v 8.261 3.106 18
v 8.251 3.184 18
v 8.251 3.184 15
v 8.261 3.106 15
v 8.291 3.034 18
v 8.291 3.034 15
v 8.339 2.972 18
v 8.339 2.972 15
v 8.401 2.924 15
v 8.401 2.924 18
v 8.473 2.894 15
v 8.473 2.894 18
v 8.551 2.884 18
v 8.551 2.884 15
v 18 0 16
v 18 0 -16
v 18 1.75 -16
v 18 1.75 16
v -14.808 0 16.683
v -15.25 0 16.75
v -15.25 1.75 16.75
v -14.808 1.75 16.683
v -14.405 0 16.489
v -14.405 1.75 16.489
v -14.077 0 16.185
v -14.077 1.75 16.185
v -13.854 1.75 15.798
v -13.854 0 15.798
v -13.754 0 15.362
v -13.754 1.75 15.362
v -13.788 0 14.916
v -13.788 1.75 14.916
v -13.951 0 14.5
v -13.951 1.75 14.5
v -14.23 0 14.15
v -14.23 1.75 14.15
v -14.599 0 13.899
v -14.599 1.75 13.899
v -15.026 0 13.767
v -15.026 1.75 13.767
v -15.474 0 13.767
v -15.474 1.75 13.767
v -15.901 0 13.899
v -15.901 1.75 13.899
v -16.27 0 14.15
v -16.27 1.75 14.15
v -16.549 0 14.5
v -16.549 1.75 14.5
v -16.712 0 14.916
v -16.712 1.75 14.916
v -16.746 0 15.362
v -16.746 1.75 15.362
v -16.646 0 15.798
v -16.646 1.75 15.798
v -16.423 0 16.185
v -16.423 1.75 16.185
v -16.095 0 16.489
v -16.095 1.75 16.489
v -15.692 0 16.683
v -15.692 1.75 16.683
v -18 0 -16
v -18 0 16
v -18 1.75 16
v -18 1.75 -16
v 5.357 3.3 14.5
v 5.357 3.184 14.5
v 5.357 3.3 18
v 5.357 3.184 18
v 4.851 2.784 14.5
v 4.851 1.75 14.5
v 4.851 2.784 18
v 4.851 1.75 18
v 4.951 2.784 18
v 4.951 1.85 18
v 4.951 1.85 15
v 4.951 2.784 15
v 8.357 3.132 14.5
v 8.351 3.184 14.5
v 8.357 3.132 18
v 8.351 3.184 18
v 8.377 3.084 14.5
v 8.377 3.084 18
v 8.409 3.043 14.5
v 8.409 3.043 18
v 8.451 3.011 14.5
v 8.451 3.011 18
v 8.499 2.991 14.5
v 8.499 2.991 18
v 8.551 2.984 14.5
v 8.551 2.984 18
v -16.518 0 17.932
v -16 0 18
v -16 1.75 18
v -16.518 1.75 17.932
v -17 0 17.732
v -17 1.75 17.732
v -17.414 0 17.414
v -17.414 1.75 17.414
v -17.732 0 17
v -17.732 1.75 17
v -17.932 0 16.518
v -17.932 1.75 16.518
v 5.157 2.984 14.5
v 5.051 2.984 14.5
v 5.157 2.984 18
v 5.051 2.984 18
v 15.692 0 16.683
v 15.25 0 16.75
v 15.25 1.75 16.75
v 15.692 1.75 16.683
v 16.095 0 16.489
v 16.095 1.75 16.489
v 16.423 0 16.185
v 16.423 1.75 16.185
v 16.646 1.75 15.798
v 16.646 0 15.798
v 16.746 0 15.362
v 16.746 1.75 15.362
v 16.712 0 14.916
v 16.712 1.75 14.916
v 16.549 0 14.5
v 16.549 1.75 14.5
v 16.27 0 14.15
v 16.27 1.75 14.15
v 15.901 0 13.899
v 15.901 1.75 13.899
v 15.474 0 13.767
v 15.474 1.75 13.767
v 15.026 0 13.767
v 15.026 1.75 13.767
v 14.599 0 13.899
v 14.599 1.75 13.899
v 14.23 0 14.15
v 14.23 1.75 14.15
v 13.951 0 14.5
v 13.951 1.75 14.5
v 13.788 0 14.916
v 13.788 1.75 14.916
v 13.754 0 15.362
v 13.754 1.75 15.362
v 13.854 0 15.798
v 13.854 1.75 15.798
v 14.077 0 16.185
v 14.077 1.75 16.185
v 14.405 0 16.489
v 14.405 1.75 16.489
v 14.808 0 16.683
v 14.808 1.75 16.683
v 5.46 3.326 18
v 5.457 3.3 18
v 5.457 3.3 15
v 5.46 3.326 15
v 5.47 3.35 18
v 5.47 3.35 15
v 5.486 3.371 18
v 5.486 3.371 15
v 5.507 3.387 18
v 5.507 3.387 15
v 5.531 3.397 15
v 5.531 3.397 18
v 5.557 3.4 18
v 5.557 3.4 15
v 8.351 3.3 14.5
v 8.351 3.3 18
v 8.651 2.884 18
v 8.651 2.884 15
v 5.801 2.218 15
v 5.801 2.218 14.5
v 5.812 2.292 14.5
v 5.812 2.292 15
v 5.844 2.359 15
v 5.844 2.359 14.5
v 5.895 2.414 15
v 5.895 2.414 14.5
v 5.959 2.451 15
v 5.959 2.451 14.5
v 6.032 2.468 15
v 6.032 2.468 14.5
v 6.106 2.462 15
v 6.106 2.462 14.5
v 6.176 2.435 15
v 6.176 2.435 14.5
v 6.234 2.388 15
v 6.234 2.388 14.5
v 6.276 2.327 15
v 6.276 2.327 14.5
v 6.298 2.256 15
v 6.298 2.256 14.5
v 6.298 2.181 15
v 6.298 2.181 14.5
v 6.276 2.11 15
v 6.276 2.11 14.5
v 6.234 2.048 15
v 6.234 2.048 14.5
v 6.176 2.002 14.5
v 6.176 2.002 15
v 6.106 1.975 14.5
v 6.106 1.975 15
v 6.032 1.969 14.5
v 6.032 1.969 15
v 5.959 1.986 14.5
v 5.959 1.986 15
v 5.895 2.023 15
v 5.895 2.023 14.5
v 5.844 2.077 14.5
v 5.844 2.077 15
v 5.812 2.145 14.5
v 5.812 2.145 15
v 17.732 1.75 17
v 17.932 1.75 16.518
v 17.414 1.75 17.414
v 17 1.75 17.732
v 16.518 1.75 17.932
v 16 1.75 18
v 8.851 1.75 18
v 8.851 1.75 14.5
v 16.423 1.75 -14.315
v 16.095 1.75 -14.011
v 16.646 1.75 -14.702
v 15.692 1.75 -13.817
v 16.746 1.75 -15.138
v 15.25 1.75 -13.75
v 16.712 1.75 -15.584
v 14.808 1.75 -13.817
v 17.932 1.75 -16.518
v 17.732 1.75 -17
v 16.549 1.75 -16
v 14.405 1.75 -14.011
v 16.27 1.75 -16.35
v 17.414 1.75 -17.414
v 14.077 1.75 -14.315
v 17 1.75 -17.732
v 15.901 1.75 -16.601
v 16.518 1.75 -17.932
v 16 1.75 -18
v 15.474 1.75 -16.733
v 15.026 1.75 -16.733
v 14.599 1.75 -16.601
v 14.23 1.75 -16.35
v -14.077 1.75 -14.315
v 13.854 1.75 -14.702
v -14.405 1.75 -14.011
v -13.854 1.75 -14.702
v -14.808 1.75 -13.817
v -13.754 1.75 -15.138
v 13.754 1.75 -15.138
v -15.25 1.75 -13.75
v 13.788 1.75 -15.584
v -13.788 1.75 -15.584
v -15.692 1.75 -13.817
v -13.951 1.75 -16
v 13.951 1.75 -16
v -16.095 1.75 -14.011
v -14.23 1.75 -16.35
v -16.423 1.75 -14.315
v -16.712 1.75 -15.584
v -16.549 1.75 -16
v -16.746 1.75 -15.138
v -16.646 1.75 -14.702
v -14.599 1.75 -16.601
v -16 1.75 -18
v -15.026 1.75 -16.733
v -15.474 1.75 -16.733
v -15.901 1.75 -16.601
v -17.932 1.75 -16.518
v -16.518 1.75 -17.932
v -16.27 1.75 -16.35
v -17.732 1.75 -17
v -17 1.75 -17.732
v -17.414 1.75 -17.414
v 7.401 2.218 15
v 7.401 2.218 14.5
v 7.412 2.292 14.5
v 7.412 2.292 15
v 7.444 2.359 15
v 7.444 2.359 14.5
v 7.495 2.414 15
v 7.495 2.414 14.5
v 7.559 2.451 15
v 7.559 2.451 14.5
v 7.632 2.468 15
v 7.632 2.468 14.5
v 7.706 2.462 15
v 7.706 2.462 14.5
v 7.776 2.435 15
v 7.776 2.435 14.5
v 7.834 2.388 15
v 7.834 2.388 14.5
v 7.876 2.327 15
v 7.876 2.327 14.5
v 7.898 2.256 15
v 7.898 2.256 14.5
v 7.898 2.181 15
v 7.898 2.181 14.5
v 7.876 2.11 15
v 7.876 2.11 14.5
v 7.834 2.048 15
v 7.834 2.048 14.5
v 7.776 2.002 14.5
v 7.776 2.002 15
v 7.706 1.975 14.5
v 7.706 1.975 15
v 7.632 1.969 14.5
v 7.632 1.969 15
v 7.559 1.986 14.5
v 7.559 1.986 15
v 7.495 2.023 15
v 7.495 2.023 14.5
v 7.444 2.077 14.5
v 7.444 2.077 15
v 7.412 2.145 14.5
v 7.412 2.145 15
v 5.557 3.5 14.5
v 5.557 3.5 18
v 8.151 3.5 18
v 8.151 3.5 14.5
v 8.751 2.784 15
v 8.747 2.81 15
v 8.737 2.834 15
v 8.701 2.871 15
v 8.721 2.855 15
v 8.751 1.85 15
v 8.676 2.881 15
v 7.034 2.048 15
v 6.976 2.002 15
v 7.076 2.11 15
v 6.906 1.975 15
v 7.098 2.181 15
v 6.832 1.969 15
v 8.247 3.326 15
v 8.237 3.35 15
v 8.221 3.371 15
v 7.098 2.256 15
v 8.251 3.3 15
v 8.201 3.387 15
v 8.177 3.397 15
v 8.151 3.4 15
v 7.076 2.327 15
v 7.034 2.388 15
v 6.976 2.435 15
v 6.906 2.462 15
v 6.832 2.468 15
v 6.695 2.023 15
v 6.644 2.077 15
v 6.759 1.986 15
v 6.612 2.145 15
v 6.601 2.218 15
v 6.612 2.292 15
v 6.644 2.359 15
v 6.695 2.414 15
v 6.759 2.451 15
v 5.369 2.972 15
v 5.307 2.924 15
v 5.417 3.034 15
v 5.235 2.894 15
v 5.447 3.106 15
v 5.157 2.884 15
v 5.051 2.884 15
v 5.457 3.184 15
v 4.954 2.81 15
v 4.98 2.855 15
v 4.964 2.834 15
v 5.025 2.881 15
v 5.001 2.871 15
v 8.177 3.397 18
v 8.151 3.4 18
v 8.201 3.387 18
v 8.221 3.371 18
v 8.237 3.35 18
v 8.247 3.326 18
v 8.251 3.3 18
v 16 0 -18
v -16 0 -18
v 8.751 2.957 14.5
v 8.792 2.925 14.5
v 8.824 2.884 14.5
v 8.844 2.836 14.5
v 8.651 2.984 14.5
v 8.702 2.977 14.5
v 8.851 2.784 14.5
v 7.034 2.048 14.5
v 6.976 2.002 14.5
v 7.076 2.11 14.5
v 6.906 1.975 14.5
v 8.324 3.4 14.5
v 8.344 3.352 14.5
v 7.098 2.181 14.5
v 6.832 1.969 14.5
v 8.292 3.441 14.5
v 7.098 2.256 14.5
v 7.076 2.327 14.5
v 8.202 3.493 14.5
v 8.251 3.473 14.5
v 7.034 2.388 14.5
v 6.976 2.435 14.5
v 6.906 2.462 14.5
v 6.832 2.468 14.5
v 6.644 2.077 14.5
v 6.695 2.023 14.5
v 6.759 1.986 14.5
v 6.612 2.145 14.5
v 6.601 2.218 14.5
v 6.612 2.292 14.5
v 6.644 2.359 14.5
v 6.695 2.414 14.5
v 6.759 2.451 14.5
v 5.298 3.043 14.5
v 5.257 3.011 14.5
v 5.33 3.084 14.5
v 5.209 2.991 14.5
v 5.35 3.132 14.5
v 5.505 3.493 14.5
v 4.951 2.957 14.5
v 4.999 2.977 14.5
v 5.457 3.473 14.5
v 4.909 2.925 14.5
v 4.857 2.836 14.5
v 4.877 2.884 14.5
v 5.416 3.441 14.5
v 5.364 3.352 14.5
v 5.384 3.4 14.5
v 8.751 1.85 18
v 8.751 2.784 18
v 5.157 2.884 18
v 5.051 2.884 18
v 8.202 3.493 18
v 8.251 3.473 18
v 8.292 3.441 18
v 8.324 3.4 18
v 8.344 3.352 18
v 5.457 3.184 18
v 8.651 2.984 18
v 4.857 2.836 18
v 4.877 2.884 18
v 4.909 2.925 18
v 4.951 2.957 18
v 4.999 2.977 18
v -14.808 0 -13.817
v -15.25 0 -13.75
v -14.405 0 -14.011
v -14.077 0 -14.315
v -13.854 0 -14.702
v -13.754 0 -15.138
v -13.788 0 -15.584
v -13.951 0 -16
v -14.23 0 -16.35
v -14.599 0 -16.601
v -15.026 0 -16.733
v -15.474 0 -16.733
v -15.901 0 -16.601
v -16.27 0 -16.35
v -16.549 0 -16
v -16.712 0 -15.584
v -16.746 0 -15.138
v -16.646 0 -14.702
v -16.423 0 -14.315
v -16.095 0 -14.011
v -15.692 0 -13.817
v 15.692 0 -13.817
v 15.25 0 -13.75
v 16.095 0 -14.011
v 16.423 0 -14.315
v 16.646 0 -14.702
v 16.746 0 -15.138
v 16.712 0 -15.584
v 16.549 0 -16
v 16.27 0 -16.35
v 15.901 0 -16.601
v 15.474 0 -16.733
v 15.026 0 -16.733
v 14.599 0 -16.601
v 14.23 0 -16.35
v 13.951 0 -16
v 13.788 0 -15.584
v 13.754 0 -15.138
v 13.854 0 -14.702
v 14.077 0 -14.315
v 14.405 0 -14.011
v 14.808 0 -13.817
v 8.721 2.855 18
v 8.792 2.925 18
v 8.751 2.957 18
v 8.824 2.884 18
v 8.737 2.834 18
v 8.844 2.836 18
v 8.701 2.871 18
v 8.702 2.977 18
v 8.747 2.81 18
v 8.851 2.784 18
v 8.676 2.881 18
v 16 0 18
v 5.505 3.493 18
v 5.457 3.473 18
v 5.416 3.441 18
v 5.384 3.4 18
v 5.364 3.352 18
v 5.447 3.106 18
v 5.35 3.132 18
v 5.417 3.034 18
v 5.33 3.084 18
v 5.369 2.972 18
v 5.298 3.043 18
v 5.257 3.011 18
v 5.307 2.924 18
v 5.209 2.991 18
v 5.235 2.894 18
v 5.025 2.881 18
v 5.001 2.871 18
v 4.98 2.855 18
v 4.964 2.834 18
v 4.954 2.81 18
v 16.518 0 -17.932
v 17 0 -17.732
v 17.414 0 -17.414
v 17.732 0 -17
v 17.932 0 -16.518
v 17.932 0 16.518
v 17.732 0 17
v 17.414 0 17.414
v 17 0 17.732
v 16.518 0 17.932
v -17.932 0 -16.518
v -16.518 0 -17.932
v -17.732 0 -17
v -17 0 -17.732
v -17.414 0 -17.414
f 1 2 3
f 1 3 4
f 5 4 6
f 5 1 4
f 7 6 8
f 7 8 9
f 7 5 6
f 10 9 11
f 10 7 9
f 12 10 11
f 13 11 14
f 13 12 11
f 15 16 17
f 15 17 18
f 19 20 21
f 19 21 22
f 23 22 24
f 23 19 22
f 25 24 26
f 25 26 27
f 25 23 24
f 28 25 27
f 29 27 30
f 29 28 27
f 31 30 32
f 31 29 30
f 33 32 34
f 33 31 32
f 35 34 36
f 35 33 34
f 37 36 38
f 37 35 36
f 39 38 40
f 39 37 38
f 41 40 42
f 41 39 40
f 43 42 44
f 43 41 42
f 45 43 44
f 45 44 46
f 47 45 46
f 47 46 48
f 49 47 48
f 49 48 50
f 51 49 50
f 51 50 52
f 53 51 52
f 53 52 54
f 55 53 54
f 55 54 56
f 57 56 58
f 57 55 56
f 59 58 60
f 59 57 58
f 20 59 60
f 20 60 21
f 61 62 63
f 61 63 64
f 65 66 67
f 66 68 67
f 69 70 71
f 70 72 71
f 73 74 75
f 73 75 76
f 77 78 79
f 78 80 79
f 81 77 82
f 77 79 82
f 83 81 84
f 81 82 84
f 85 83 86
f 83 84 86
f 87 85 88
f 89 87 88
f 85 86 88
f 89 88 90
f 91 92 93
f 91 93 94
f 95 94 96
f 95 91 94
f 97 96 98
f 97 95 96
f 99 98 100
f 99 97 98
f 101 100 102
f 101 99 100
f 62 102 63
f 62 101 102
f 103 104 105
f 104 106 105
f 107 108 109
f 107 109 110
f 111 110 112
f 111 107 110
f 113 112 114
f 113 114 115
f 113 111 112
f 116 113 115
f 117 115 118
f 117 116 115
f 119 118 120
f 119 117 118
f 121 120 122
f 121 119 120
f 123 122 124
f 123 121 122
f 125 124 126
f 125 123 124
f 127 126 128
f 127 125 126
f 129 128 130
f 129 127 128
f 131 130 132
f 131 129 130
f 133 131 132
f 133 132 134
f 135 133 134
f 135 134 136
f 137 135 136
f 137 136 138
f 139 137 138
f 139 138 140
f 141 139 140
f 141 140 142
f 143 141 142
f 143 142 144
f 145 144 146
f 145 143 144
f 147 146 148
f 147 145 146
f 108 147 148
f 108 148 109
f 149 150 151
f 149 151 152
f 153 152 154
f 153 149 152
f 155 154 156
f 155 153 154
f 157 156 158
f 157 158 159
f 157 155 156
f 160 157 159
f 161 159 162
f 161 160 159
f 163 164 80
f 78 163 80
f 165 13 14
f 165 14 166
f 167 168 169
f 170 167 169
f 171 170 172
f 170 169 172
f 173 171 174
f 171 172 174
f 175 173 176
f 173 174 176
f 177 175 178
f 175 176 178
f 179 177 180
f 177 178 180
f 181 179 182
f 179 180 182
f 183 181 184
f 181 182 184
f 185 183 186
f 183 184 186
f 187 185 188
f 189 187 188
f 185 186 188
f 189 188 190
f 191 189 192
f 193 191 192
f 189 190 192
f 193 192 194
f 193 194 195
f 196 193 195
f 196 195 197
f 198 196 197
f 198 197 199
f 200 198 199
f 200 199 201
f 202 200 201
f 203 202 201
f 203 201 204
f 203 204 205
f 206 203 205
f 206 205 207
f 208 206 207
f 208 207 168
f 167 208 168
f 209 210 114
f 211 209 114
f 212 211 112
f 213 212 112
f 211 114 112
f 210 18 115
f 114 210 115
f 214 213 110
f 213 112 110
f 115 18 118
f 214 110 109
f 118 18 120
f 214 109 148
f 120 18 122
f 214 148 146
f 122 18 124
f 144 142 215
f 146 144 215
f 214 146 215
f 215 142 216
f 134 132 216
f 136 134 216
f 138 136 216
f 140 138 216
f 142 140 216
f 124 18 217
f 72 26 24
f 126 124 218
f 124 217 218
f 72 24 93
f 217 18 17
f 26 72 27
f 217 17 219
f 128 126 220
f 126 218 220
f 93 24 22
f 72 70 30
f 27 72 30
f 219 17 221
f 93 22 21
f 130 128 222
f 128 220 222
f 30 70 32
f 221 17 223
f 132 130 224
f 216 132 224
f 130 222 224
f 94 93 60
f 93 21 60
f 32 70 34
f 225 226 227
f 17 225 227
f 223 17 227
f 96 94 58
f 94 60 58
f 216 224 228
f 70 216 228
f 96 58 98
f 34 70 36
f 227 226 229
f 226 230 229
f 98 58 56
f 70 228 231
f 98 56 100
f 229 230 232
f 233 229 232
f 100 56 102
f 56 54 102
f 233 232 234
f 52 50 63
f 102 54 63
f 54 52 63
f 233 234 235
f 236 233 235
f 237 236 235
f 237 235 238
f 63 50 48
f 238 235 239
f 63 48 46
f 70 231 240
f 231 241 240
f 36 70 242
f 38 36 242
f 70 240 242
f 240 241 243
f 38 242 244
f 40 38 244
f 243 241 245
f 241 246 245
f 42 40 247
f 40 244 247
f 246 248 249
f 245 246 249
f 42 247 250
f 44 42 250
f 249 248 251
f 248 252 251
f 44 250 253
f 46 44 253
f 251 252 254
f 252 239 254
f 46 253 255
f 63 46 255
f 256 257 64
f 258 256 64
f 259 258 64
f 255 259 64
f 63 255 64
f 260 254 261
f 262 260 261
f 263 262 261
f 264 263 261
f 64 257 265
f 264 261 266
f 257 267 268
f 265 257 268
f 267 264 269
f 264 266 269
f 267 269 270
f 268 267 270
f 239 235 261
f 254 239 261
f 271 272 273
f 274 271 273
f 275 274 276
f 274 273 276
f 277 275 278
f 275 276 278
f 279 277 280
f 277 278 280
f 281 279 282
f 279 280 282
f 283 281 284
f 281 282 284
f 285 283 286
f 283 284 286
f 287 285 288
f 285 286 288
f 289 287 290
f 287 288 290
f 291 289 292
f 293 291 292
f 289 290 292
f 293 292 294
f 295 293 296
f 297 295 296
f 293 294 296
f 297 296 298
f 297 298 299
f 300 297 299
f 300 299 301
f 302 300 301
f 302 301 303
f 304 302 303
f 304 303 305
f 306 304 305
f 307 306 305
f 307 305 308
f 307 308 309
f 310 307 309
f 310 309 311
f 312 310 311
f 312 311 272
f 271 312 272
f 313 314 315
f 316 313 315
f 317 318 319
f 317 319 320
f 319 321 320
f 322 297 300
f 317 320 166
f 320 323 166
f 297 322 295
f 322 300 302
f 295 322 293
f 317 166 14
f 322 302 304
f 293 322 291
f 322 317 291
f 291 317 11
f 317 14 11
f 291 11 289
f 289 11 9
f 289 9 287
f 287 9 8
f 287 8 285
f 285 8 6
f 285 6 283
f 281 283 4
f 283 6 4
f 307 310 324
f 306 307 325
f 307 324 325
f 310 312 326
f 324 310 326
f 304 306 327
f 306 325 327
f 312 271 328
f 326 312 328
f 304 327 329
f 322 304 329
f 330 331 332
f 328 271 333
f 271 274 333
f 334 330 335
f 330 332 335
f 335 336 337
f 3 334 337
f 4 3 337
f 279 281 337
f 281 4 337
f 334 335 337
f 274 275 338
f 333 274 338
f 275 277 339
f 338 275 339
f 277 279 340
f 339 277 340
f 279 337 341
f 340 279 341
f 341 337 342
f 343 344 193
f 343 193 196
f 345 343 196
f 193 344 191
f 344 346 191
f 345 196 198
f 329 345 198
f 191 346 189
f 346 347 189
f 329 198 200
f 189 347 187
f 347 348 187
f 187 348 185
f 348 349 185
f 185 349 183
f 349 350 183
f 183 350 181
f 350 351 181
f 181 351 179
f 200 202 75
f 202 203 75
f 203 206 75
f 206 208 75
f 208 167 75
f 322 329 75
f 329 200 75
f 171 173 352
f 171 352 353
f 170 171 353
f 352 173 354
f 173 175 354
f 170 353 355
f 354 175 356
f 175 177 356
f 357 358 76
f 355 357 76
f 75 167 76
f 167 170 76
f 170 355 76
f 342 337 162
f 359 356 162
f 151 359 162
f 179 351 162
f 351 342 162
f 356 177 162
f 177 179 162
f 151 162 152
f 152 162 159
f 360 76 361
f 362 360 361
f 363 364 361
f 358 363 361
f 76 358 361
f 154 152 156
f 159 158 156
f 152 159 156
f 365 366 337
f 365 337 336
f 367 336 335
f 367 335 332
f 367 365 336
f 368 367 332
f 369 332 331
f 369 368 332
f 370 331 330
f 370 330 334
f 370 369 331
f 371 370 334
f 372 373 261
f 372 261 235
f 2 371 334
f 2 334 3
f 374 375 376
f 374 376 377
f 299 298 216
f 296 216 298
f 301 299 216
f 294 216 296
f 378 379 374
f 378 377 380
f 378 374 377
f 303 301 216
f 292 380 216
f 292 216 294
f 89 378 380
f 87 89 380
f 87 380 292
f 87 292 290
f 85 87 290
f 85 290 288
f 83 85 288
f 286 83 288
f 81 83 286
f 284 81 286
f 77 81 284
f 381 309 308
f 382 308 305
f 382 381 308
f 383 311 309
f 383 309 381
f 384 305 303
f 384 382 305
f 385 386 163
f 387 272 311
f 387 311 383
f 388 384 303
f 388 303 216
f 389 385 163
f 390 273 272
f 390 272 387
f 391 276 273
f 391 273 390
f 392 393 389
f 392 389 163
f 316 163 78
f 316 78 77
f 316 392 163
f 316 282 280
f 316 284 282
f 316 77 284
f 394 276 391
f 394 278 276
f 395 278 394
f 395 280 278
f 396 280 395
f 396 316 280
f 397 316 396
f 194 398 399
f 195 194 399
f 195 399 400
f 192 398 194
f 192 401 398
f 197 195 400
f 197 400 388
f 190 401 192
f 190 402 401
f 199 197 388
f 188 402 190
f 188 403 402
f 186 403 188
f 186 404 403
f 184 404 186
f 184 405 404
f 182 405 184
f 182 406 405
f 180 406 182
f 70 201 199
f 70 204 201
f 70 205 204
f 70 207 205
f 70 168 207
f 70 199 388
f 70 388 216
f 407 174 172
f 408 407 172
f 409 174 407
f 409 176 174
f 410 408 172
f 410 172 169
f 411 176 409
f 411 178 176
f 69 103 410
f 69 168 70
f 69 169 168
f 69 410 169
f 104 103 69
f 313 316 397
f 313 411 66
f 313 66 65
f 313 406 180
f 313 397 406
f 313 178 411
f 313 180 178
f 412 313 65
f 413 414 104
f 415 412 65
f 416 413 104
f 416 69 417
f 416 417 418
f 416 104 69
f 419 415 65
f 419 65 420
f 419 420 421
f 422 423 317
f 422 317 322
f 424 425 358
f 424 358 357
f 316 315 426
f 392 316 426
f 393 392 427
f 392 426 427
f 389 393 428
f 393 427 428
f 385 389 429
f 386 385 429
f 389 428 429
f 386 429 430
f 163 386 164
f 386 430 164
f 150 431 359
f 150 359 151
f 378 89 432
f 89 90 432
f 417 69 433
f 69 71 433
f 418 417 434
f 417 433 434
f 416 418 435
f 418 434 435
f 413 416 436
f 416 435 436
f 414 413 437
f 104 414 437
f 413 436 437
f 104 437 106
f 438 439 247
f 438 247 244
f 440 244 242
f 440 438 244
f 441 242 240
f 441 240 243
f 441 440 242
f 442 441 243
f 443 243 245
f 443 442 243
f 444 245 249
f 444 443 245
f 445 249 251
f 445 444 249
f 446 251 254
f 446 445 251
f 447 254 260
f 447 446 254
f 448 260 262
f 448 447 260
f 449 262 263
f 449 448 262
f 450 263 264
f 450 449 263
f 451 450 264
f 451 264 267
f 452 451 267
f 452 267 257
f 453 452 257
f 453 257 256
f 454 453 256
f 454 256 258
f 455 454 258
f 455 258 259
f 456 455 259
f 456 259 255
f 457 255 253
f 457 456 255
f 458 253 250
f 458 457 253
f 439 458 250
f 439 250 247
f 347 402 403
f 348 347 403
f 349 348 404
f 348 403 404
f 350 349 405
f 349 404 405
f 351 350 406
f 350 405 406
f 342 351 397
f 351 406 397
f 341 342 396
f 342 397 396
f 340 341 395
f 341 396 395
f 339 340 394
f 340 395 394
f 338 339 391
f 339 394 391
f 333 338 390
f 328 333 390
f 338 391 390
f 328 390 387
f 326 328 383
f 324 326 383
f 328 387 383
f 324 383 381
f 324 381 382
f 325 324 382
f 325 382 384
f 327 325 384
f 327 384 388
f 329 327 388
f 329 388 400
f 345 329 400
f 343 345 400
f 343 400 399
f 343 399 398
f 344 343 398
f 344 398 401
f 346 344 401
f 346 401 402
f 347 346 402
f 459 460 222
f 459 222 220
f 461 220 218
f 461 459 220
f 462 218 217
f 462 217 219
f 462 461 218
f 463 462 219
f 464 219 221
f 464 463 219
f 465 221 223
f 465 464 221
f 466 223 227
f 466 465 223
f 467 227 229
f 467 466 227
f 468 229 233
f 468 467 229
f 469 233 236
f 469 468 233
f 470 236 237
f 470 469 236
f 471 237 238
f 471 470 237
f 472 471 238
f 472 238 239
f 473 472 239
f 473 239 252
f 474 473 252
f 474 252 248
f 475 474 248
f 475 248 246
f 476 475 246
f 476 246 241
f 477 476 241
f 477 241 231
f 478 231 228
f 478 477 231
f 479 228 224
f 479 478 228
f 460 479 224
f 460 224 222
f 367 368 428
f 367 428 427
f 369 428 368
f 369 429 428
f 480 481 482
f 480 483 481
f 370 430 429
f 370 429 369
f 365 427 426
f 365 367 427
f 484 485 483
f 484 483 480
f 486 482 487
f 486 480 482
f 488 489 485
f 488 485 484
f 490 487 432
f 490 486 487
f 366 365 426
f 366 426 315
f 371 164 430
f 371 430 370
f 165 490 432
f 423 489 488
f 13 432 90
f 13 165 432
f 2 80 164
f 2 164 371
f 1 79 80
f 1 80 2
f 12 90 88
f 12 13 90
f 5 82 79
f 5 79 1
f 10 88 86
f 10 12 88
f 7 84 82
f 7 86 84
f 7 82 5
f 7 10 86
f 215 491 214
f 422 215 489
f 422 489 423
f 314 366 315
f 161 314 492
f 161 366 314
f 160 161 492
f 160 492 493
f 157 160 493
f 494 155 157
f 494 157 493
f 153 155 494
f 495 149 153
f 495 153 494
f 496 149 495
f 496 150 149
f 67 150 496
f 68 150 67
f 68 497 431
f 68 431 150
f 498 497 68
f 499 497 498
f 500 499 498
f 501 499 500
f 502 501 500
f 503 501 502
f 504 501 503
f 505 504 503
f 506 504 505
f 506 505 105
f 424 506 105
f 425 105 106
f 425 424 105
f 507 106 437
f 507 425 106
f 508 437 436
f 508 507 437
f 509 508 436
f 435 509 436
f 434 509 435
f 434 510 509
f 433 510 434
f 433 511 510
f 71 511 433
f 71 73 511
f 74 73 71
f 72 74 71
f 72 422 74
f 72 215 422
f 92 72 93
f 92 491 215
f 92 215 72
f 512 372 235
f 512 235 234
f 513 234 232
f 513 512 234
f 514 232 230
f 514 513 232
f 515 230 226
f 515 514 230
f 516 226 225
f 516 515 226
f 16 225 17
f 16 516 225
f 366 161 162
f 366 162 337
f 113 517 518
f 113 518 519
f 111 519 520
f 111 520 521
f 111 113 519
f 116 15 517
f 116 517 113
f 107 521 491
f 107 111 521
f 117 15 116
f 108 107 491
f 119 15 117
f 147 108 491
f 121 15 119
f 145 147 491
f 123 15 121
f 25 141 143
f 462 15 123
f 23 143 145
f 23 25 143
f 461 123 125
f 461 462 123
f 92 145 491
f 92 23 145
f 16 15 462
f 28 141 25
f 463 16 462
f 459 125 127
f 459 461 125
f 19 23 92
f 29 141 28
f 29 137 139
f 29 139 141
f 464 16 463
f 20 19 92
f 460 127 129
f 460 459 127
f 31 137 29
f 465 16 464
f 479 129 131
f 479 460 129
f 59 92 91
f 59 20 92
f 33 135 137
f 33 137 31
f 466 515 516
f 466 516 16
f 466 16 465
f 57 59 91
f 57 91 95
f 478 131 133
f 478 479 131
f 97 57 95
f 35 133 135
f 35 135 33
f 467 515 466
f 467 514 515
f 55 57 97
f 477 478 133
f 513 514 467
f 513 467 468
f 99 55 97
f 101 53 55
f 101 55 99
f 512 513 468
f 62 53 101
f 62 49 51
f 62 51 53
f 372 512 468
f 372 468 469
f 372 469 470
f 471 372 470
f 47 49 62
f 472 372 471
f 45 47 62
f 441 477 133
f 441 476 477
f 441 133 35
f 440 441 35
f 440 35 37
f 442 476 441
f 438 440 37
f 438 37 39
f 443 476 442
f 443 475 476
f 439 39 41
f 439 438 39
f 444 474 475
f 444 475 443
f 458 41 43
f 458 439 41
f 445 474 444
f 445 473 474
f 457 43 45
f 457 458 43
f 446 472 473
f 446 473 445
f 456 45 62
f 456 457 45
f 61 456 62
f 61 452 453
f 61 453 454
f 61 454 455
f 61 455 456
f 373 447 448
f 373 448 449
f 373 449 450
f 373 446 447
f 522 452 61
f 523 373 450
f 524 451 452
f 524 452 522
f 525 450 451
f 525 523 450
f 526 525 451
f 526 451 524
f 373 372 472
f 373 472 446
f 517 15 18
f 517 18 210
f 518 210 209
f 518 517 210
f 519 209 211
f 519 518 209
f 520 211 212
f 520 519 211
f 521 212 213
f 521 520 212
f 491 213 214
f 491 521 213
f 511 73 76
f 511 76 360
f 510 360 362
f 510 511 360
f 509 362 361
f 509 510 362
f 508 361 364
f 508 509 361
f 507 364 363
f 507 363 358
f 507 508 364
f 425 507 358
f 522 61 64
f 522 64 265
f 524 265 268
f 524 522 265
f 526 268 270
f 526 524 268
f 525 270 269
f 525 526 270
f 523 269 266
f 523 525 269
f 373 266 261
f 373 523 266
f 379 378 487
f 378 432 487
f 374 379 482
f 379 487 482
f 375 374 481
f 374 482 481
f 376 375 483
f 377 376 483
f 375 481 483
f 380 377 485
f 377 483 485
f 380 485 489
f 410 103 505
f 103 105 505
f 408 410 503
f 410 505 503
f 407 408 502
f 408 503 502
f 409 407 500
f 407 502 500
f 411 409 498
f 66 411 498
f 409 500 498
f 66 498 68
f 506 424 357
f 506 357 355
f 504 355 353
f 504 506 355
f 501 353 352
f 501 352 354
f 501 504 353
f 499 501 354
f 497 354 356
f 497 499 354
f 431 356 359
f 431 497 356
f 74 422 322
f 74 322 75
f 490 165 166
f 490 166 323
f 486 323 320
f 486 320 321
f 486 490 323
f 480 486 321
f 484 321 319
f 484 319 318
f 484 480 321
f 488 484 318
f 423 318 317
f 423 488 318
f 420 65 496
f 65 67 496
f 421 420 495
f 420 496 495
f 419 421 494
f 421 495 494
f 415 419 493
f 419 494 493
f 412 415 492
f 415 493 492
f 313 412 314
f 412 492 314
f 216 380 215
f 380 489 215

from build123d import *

# Parameters (mm, degrees)
SKETCH2_R           = 1.5
BOSS_EXTRUDE1_DEPTH = 1.75
BOSS_EXTRUDE2_DEPTH = 3
BOSS_EXTRUDE3_DEPTH = 0.5
SKETCH6_R           = 0.25
CUT_EXTRUDE1_DEPTH  = 38.316216314


with BuildPart() as part:
    # Sketch2 → Boss-Extrude1 (new body)
    with BuildSketch(Plane(origin=(0, 0, 0), x_dir=(1, 0, 0), z_dir=(0, 1, 0))):
        with BuildLine():
            Line((16, -18), (-16, -18))
            ThreePointArc((-16, -18), (-17.414213562, -17.414213562), (-18, -16))
            Line((-18, -16), (-18, 16))
            ThreePointArc((-18, 16), (-17.414213562, 17.414213562), (-16, 18))
            Line((-16, 18), (16, 18))
            ThreePointArc((16, 18), (17.414213562, 17.414213562), (18, 16))
            Line((18, 16), (18, -16))
            ThreePointArc((18, -16), (17.414213562, -17.414213562), (16, -18))
        make_face()
        with Locations(Location((-15.25, 15.25, 0), (0, 0, 270))):
            Circle(SKETCH2_R, mode=Mode.SUBTRACT)
        with Locations(Location((15.25, 15.25, 0), (0, 0, 270))):
            Circle(SKETCH2_R, mode=Mode.SUBTRACT)
        with Locations(Location((15.25, -15.25, 0), (0, 0, 270))):
            Circle(SKETCH2_R, mode=Mode.SUBTRACT)
        with Locations(Location((-15.25, -15.25, 0), (0, 0, 270))):
            Circle(SKETCH2_R, mode=Mode.SUBTRACT)
    extrude(amount=BOSS_EXTRUDE1_DEPTH)

    # Sketch3 → Boss-Extrude2 (add)
    with BuildSketch(Plane.XY.offset(18)):
        with BuildLine():
            Line((5.557062961, 3.5), (8.150682516, 3.5))
            ThreePointArc((8.150682516, 3.5), (8.292103872, 3.441421356), (8.350682516, 3.3))
            Line((8.350682516, 3.3), (8.350682516, 3.184070744))
            ThreePointArc((8.350682516, 3.184070744), (8.40926116, 3.042649388), (8.550682516, 2.984070744))
            Line((8.550682516, 2.984070744), (8.650583865, 2.984070744))
            ThreePointArc((8.650583865, 2.984070744), (8.792005221, 2.925492101), (8.850583865, 2.784070744))
            Line((8.850583865, 2.784070744), (8.850583865, 1.75))
            Line((8.850583865, 1.75), (4.850583865, 1.75))
            Line((4.850583865, 1.75), (4.850583865, 2.784070744))
            ThreePointArc((4.850583865, 2.784070744), (4.909162509, 2.925492101), (5.050583865, 2.984070744))
            Line((5.050583865, 2.984070744), (5.157062961, 2.984070744))
            ThreePointArc((5.157062961, 2.984070744), (5.298484317, 3.042649388), (5.357062961, 3.184070744))
            Line((5.357062961, 3.184070744), (5.357062961, 3.3))
            ThreePointArc((5.357062961, 3.3), (5.415641605, 3.441421356), (5.557062961, 3.5))
        make_face()
        with BuildLine():
            Line((5.557062961, 3.4), (8.150682516, 3.4))
            ThreePointArc((8.150682516, 3.4), (8.221393194, 3.370710678), (8.250682516, 3.3))
            Line((8.250682516, 3.3), (8.250682516, 3.184070744))
            ThreePointArc((8.250682516, 3.184070744), (8.338550482, 2.97193871), (8.550682516, 2.884070744))
            Line((8.550682516, 2.884070744), (8.650583865, 2.884070744))
            ThreePointArc((8.650583865, 2.884070744), (8.721294543, 2.854781422), (8.750583865, 2.784070744))
            Line((8.750583865, 2.784070744), (8.750583865, 1.85))
            Line((8.750583865, 1.85), (4.950583865, 1.85))
            Line((4.950583865, 1.85), (4.950583865, 2.784070744))
            ThreePointArc((4.950583865, 2.784070744), (4.979873187, 2.854781422), (5.050583865, 2.884070744))
            Line((5.050583865, 2.884070744), (5.157062961, 2.884070744))
            ThreePointArc((5.157062961, 2.884070744), (5.369194995, 2.97193871), (5.457062961, 3.184070744))
            Line((5.457062961, 3.184070744), (5.457062961, 3.3))
            ThreePointArc((5.457062961, 3.3), (5.486352283, 3.370710678), (5.557062961, 3.4))
        make_face(mode=Mode.SUBTRACT)
    extrude(amount=-BOSS_EXTRUDE2_DEPTH)

    # Sketch5 → Boss-Extrude3 (add)
    with BuildSketch(Plane(origin=(0, 0, 15), x_dir=(-1, 0, 0), z_dir=(0, 0, -1))):
        with BuildLine():
            Line((-8.350682516, 3.3), (-8.350682516, 3.184070744))
            ThreePointArc((-8.350682516, 3.184070744), (-8.40926116, 3.042649388), (-8.550682516, 2.984070744))
            Line((-8.550682516, 2.984070744), (-8.650583865, 2.984070744))
            ThreePointArc((-8.650583865, 2.984070744), (-8.792005221, 2.925492101), (-8.850583865, 2.784070744))
            Line((-8.850583865, 2.784070744), (-8.850583865, 1.75))
            Line((-8.850583865, 1.75), (-4.850583865, 1.75))
            Line((-4.850583865, 1.75), (-4.850583865, 2.784070744))
            ThreePointArc((-4.850583865, 2.784070744), (-4.909162509, 2.925492101), (-5.050583865, 2.984070744))
            Line((-5.050583865, 2.984070744), (-5.157062961, 2.984070744))
            ThreePointArc((-5.157062961, 2.984070744), (-5.298484317, 3.042649388), (-5.357062961, 3.184070744))
            Line((-5.357062961, 3.184070744), (-5.357062961, 3.3))
            ThreePointArc((-5.357062961, 3.3), (-5.415641605, 3.441421356), (-5.557062961, 3.5))
            Line((-5.557062961, 3.5), (-8.150682516, 3.5))
            ThreePointArc((-8.150682516, 3.5), (-8.292103872, 3.441421356), (-8.350682516, 3.3))
        make_face()
    extrude(amount=BOSS_EXTRUDE3_DEPTH)

    # Sketch6 → Cut-Extrude1 (cut, through all)
    with BuildSketch(Plane(origin=(0, 0, 14.5), x_dir=(-1, 0, 0), z_dir=(0, 0, -1))):
        with Locations((-7.650583865, 2.218305959)):
            Circle(SKETCH6_R)
        with Locations((-6.850583865, 2.218305959)):
            Circle(SKETCH6_R)
        with Locations((-6.050583865, 2.218305959)):
            Circle(SKETCH6_R)
    extrude(amount=-CUT_EXTRUDE1_DEPTH, mode=Mode.SUBTRACT)


solid = part.part
